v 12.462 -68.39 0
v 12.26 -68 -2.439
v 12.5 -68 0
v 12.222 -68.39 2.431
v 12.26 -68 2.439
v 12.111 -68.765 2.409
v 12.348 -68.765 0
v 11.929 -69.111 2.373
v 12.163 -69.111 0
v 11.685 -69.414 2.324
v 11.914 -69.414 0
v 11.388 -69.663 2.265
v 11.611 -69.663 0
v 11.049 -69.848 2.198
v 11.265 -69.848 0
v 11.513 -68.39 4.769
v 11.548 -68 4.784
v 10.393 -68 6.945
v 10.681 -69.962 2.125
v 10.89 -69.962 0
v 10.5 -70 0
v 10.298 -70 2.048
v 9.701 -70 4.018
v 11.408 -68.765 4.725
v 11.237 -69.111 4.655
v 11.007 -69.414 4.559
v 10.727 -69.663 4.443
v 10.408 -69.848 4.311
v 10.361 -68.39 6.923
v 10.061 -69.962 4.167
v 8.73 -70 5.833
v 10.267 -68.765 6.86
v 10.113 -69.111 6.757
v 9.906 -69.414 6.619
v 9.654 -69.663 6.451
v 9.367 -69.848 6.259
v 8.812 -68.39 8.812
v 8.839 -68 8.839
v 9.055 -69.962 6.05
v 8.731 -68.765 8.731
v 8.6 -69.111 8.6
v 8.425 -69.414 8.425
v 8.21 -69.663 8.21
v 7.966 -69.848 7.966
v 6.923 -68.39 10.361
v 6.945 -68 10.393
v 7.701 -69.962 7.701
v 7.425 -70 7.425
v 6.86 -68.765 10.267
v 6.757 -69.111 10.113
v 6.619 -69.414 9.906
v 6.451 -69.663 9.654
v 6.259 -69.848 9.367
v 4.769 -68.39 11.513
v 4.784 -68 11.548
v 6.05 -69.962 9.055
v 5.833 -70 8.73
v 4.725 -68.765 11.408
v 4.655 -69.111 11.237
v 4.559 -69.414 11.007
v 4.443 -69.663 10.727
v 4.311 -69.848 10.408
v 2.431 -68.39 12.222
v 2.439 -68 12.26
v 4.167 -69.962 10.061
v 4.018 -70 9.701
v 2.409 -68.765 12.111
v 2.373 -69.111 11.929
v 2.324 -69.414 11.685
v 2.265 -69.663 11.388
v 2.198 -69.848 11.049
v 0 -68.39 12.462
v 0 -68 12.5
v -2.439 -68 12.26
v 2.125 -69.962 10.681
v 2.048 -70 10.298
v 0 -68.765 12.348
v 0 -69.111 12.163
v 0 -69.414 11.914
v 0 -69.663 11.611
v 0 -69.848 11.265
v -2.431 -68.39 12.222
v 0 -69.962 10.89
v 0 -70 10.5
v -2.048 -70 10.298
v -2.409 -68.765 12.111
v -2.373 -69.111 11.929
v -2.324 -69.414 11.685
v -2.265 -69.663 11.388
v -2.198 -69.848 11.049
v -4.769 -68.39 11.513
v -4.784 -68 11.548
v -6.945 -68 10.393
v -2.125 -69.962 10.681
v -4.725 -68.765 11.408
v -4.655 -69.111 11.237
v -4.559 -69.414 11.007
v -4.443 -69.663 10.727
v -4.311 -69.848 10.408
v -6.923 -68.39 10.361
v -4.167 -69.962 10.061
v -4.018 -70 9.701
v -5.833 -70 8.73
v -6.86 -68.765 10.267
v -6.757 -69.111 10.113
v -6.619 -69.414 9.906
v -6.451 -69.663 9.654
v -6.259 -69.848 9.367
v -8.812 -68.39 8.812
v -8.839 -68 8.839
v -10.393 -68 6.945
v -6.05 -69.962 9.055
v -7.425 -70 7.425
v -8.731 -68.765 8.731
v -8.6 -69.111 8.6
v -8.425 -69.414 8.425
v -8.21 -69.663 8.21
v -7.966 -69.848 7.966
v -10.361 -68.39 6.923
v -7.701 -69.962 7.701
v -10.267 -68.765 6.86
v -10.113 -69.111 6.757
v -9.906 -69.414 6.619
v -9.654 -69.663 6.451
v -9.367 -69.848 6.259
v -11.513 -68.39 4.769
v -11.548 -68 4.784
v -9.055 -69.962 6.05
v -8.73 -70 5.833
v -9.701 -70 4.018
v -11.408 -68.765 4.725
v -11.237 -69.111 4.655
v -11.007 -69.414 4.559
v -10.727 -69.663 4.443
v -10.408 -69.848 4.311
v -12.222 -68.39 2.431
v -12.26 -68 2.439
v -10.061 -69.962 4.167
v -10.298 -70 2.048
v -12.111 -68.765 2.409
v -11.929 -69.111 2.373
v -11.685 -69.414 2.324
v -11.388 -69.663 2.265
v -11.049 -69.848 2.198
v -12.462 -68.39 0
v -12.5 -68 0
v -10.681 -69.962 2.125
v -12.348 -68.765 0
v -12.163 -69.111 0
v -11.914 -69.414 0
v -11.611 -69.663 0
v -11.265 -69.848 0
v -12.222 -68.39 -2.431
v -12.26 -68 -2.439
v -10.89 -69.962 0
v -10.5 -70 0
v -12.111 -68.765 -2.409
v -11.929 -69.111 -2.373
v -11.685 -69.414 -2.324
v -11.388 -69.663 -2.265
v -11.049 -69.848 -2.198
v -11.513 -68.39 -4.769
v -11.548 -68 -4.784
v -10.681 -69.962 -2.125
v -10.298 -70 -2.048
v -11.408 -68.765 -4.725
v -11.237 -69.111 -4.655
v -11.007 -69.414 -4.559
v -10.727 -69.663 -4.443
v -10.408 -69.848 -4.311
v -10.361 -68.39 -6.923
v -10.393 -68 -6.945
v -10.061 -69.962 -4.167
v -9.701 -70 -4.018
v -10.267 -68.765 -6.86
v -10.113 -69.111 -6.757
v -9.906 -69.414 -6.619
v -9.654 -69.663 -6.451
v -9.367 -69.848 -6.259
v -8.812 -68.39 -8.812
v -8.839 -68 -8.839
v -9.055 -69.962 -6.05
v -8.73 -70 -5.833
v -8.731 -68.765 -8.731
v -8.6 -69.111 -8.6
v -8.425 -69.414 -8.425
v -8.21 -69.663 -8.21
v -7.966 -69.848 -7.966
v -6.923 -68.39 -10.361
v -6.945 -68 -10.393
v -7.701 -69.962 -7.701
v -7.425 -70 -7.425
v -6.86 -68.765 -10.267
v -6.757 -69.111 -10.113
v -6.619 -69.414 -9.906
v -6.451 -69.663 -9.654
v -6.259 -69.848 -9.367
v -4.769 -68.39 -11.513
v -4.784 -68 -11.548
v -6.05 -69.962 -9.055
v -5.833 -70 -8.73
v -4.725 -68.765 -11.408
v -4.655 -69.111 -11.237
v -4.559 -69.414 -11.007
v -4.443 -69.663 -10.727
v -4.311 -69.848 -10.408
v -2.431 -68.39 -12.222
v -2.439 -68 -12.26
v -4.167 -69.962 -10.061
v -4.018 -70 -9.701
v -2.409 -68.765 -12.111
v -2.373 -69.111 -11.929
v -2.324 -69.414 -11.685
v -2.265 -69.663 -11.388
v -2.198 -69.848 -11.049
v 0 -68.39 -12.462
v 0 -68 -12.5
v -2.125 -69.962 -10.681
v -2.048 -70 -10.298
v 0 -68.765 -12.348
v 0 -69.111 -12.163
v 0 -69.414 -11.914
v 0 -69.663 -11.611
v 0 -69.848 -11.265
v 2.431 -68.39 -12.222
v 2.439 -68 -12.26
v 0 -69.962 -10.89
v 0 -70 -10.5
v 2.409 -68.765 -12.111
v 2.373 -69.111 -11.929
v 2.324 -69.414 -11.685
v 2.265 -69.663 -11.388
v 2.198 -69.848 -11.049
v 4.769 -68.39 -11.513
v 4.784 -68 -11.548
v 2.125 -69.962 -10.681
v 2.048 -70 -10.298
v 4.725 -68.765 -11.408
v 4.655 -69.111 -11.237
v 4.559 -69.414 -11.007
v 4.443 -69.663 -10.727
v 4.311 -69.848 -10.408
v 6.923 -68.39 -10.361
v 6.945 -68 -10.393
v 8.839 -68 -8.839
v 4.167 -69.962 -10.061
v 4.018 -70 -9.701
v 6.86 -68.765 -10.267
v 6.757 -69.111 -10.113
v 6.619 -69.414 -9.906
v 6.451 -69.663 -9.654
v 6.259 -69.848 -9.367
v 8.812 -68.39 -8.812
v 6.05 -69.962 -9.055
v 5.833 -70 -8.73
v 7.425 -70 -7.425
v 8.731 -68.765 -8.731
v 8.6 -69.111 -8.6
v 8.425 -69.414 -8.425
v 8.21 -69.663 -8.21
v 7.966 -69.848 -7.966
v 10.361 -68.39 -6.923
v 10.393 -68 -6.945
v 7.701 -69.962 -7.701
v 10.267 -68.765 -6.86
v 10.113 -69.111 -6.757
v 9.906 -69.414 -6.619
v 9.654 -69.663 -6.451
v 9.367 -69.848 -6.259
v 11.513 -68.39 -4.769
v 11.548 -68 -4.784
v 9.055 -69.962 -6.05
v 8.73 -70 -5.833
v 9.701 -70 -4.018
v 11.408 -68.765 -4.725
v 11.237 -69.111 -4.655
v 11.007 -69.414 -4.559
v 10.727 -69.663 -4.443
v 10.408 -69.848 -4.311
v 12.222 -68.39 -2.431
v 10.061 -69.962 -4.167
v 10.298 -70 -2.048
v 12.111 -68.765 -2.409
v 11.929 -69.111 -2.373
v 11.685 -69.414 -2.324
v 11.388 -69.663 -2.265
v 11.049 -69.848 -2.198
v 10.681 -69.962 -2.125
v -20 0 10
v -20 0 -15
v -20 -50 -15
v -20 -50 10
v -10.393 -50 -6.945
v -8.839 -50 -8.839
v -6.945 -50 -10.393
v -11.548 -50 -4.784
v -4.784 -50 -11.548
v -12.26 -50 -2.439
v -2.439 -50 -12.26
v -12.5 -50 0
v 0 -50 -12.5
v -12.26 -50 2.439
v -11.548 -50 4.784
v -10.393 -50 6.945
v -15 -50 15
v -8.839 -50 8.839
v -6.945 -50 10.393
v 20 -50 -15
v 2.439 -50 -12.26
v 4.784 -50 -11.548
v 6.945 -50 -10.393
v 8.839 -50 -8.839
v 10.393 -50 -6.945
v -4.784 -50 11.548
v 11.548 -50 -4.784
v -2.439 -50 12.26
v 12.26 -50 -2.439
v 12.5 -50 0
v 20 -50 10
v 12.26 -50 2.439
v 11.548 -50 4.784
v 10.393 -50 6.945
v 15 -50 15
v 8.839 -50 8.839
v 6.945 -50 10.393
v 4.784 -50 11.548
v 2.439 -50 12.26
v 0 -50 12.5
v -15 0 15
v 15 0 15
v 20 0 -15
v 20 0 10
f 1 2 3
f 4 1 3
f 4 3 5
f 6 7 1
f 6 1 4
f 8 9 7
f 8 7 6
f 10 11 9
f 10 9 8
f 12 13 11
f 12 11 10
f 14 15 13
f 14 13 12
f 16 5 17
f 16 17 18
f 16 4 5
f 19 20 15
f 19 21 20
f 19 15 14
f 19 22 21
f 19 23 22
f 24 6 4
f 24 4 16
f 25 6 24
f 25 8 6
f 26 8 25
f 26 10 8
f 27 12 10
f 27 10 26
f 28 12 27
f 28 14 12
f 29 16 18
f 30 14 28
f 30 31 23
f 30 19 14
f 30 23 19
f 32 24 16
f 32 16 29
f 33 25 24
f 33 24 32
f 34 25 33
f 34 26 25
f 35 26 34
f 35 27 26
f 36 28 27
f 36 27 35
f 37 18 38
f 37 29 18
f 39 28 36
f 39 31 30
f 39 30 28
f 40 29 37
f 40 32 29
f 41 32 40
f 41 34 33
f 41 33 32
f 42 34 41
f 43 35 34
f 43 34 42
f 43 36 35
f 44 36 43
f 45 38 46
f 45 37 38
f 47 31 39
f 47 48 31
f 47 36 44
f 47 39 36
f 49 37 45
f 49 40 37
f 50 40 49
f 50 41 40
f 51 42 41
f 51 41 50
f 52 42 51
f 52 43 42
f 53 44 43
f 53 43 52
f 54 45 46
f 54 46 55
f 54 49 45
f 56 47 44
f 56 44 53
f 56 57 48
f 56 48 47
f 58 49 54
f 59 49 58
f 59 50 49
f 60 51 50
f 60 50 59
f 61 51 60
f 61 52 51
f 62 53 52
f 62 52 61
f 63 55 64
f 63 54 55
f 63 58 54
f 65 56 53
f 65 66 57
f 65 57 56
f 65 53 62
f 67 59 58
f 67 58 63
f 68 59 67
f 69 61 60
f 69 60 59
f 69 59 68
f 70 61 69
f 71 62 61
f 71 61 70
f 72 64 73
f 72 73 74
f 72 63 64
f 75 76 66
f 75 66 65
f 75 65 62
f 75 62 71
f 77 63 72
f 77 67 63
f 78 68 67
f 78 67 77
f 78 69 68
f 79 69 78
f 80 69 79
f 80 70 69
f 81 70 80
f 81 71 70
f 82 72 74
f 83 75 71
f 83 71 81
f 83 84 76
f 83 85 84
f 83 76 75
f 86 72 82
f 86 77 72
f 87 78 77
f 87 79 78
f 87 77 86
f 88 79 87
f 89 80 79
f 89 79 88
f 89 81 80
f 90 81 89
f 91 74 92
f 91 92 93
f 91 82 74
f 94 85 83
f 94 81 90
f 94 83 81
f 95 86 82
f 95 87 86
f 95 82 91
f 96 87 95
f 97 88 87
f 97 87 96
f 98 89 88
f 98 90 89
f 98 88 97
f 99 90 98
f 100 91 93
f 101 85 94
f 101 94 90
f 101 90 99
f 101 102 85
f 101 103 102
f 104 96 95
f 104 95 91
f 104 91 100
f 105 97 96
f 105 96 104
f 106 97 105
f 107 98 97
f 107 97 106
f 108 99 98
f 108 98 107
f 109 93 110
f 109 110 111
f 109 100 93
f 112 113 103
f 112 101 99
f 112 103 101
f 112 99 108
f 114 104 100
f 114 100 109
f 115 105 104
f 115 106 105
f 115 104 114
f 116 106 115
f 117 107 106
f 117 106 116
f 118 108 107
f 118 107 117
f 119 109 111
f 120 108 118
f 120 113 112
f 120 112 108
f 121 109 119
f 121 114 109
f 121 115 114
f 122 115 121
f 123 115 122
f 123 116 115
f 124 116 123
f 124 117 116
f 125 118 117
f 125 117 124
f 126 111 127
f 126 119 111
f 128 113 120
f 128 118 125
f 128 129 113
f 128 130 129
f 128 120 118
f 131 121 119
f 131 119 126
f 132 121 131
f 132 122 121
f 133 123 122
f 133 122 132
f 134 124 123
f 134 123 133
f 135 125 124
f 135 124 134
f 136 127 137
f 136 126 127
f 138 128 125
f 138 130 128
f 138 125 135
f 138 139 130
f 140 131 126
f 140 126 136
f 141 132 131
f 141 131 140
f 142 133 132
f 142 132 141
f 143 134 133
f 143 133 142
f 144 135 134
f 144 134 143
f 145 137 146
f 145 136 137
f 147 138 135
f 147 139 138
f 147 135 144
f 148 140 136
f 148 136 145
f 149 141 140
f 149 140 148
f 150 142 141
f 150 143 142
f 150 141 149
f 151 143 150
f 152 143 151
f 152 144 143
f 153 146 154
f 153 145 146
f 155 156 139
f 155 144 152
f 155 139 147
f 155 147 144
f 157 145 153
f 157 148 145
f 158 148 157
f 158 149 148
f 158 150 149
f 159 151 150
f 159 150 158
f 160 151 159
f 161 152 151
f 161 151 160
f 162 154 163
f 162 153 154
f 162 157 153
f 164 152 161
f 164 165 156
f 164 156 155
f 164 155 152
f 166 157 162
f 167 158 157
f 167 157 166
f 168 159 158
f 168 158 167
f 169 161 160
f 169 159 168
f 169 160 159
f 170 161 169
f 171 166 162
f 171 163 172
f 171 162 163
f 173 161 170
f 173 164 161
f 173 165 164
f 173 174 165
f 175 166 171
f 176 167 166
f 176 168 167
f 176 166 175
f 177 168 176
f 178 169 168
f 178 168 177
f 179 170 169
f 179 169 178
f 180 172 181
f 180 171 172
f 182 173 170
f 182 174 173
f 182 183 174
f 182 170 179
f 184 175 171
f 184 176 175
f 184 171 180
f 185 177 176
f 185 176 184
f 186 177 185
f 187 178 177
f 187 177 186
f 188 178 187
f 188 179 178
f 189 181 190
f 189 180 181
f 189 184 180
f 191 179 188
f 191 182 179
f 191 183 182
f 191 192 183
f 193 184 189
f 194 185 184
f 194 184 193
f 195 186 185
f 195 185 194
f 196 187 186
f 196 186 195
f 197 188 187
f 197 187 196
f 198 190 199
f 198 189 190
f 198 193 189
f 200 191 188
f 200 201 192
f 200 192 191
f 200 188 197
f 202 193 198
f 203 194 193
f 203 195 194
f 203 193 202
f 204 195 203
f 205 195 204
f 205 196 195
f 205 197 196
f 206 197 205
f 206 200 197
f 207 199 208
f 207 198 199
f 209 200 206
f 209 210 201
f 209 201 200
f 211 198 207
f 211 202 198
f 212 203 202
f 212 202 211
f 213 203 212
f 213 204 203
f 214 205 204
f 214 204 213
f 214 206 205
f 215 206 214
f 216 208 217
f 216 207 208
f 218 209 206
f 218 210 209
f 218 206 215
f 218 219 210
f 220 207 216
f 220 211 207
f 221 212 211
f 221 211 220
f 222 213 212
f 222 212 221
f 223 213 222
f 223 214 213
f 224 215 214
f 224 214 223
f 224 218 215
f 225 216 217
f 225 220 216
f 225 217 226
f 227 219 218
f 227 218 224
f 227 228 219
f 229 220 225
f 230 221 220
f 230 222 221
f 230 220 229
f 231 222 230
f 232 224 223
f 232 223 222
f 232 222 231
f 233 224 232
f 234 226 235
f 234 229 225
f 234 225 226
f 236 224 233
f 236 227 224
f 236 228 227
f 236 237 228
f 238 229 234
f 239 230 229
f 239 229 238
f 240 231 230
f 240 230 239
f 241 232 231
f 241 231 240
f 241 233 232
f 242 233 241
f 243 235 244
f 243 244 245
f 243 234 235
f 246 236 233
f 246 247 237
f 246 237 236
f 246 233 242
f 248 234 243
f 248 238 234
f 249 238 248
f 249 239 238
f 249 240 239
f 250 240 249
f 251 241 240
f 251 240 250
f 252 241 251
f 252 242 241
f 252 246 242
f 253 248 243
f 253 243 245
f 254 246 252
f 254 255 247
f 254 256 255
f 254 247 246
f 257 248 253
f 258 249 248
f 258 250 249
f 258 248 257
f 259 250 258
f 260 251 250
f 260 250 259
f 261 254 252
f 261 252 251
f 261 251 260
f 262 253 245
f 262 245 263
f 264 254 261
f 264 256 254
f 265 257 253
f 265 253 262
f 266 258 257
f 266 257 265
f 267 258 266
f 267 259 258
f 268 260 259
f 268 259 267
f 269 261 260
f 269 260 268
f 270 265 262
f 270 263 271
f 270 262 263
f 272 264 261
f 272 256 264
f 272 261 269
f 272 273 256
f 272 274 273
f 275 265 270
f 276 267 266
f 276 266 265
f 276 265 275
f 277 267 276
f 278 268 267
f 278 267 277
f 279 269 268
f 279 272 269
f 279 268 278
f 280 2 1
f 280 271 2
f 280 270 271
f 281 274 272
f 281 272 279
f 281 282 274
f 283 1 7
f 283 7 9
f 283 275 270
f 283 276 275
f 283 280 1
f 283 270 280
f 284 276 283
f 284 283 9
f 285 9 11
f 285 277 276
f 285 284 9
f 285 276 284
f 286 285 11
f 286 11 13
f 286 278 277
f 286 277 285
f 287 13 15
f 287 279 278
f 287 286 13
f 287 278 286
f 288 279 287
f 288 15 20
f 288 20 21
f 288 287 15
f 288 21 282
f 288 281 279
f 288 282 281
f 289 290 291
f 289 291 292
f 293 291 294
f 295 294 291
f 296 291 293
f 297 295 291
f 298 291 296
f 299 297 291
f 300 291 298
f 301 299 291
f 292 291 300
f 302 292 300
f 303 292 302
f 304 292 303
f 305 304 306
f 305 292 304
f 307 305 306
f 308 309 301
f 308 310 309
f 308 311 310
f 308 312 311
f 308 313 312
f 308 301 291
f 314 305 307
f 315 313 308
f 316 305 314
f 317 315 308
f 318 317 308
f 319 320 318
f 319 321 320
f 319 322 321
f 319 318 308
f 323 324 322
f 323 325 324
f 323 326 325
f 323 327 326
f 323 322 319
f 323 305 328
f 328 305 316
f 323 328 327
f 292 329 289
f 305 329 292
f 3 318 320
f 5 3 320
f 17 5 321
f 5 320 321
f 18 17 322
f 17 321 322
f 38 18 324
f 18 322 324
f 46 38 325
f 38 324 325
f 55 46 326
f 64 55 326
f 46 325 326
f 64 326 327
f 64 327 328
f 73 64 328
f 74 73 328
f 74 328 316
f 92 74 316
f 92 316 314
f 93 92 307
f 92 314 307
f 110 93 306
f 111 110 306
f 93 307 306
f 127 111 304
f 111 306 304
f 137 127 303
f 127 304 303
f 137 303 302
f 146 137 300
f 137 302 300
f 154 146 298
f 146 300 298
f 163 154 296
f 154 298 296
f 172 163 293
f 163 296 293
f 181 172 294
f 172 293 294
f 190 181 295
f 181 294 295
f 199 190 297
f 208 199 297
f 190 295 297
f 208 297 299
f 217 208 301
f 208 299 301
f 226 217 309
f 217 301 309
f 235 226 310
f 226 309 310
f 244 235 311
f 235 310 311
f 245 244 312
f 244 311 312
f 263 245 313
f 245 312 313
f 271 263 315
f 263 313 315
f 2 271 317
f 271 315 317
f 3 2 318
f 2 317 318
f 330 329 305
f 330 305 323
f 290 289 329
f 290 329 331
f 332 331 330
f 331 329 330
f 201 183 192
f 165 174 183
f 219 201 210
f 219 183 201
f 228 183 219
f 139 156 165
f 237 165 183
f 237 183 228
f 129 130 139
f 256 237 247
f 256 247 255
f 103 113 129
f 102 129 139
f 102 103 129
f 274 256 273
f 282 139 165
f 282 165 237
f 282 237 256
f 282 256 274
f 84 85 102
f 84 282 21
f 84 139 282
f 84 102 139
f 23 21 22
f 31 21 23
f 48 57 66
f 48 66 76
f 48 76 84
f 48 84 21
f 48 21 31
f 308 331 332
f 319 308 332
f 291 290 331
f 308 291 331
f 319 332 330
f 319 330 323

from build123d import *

# Parameters (mm, degrees)
F0_W     = 40
F0_H     = 30
F1_DEPTH = 50
F2_R     = 12.5
F3_DEPTH = 20
F4_R     = 2
F5_SIZE  = 5


with BuildPart() as f1:
    # F0 (on Front) → F1 (new body)
    with BuildSketch(Plane.XZ):
        Rectangle(F0_W, F0_H)
    extrude(amount=F1_DEPTH)

    # F2 (on face) → F3 (join)
    with BuildSketch(Plane.XZ.offset(50)):
        Circle(F2_R)
    extrude(amount=F3_DEPTH)

    # F4
    f4_edges = [f1.edges().sort_by_distance(p)[0] for p in [
        (-12.5, -70, 0),
    ]]
    fillet(f4_edges, radius=F4_R)

    # F5
    f5_edges = [f1.edges().sort_by_distance(p)[0] for p in [
        (-20, -25, 15),
        (20, -25, 15),
    ]]
    chamfer(f5_edges, length=F5_SIZE)


solid = f1.part
